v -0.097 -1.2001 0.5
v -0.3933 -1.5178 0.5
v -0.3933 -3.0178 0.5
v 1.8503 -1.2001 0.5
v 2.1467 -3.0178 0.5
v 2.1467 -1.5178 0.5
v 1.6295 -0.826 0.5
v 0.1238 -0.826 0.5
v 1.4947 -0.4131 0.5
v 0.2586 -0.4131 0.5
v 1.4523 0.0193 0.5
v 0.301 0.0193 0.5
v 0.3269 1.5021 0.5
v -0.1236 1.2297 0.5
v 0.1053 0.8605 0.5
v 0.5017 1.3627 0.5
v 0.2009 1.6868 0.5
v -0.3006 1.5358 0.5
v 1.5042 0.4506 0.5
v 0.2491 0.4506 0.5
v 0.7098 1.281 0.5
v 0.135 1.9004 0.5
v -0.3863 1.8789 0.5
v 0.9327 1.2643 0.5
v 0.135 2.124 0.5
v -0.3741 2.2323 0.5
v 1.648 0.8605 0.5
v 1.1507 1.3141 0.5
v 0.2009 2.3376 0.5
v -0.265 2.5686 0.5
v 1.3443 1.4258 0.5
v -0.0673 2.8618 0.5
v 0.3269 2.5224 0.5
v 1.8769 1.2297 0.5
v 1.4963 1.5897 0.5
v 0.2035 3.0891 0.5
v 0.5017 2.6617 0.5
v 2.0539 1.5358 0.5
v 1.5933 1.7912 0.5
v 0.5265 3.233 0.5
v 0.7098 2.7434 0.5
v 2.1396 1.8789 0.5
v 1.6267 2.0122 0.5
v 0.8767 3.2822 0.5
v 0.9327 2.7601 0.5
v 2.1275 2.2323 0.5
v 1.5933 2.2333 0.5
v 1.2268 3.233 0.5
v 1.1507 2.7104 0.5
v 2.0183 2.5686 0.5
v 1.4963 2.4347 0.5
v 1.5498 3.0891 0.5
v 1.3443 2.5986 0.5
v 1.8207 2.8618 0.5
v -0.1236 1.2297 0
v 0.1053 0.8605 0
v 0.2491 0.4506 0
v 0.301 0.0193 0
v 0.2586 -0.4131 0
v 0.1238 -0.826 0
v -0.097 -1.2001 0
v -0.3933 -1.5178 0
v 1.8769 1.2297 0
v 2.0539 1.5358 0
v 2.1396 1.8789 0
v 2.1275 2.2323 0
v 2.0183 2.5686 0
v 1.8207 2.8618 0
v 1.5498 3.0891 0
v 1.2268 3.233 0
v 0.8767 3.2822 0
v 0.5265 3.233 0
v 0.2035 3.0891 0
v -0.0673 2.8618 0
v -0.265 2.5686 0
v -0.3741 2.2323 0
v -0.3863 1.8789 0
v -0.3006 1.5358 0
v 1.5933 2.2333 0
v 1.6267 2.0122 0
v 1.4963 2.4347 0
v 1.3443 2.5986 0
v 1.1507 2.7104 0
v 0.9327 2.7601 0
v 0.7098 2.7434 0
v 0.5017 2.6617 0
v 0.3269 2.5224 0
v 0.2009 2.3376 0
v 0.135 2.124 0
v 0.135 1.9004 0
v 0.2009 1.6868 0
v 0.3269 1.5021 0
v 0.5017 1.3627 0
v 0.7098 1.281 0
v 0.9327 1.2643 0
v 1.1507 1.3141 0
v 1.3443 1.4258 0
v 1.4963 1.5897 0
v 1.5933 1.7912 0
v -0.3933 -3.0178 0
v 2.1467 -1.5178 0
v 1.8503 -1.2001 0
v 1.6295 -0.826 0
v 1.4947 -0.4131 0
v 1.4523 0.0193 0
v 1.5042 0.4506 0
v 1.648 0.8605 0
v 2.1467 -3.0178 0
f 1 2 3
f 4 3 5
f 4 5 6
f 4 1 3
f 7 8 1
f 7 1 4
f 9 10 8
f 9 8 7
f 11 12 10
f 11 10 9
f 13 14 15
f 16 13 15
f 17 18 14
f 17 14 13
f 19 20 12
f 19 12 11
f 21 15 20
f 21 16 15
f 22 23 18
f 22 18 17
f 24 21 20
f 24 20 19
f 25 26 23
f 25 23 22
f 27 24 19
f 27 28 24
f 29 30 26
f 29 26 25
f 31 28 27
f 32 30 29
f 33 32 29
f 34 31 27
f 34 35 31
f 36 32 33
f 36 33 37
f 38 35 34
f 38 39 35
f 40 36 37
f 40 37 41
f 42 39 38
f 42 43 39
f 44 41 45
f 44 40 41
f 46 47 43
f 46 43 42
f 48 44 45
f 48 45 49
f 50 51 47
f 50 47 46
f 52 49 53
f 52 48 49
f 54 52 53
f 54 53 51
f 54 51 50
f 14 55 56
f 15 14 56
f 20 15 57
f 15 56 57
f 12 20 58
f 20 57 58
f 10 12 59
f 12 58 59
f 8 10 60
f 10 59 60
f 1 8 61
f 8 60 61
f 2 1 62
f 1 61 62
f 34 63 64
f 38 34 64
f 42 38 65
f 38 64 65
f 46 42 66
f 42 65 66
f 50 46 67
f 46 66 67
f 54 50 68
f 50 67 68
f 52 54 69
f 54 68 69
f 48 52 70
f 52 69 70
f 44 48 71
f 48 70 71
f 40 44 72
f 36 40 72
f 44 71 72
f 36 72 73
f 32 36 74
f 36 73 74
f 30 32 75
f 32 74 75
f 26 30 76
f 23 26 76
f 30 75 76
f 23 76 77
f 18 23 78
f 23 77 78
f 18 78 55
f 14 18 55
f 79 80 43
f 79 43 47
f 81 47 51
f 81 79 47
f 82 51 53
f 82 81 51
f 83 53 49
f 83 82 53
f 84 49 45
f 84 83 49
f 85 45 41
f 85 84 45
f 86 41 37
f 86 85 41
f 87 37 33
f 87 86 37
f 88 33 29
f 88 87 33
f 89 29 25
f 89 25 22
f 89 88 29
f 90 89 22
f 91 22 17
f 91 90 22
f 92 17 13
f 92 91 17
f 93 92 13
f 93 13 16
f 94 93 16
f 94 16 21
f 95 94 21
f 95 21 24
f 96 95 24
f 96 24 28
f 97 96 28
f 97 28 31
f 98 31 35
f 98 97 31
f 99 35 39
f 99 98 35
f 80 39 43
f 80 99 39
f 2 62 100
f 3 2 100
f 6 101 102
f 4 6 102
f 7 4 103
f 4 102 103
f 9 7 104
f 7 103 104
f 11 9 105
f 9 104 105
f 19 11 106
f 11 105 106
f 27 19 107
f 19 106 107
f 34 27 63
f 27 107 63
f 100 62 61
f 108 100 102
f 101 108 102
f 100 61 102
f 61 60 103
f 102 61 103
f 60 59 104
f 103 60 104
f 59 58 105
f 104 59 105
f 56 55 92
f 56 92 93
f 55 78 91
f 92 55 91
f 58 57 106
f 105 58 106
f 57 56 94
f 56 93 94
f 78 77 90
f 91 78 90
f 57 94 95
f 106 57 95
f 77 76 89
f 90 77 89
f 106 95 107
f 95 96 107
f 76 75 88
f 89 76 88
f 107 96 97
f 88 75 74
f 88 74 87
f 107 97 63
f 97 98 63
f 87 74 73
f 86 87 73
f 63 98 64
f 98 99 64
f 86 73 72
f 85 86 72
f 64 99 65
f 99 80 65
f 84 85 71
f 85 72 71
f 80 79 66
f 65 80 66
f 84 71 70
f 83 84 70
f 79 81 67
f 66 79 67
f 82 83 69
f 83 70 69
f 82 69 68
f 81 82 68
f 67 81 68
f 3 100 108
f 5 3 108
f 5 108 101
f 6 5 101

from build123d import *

# Parameters (mm, degrees)
SKETCH1_R           = 0.75
BOSS_EXTRUDE1_DEPTH = 0.5


with BuildPart() as part:
    # Sketch1 → Boss-Extrude1 (new body)
    with BuildSketch(Plane.XY):
        with BuildLine():
            Line((-0.393333333, -3.017777778), (2.146666667, -3.017777778))
            Line((2.146666667, -3.017777778), (2.146666667, -1.517777778))
            ThreePointArc((2.146666667, -1.517777778), (1.4617431, -0.198043481), (1.876940292, 1.229692558))
            ThreePointArc((1.876940292, 1.229692558), (0.876666667, 3.282222222), (-0.123606959, 1.229692558))
            ThreePointArc((-0.123606959, 1.229692558), (0.291590233, -0.198043481), (-0.393333333, -1.517777778))
            Line((-0.393333333, -1.517777778), (-0.393333333, -3.017777778))
        make_face()
        with Locations((0.876666667, 2.012222222)):
            Circle(SKETCH1_R, mode=Mode.SUBTRACT)
    extrude(amount=BOSS_EXTRUDE1_DEPTH)


solid = part.part
